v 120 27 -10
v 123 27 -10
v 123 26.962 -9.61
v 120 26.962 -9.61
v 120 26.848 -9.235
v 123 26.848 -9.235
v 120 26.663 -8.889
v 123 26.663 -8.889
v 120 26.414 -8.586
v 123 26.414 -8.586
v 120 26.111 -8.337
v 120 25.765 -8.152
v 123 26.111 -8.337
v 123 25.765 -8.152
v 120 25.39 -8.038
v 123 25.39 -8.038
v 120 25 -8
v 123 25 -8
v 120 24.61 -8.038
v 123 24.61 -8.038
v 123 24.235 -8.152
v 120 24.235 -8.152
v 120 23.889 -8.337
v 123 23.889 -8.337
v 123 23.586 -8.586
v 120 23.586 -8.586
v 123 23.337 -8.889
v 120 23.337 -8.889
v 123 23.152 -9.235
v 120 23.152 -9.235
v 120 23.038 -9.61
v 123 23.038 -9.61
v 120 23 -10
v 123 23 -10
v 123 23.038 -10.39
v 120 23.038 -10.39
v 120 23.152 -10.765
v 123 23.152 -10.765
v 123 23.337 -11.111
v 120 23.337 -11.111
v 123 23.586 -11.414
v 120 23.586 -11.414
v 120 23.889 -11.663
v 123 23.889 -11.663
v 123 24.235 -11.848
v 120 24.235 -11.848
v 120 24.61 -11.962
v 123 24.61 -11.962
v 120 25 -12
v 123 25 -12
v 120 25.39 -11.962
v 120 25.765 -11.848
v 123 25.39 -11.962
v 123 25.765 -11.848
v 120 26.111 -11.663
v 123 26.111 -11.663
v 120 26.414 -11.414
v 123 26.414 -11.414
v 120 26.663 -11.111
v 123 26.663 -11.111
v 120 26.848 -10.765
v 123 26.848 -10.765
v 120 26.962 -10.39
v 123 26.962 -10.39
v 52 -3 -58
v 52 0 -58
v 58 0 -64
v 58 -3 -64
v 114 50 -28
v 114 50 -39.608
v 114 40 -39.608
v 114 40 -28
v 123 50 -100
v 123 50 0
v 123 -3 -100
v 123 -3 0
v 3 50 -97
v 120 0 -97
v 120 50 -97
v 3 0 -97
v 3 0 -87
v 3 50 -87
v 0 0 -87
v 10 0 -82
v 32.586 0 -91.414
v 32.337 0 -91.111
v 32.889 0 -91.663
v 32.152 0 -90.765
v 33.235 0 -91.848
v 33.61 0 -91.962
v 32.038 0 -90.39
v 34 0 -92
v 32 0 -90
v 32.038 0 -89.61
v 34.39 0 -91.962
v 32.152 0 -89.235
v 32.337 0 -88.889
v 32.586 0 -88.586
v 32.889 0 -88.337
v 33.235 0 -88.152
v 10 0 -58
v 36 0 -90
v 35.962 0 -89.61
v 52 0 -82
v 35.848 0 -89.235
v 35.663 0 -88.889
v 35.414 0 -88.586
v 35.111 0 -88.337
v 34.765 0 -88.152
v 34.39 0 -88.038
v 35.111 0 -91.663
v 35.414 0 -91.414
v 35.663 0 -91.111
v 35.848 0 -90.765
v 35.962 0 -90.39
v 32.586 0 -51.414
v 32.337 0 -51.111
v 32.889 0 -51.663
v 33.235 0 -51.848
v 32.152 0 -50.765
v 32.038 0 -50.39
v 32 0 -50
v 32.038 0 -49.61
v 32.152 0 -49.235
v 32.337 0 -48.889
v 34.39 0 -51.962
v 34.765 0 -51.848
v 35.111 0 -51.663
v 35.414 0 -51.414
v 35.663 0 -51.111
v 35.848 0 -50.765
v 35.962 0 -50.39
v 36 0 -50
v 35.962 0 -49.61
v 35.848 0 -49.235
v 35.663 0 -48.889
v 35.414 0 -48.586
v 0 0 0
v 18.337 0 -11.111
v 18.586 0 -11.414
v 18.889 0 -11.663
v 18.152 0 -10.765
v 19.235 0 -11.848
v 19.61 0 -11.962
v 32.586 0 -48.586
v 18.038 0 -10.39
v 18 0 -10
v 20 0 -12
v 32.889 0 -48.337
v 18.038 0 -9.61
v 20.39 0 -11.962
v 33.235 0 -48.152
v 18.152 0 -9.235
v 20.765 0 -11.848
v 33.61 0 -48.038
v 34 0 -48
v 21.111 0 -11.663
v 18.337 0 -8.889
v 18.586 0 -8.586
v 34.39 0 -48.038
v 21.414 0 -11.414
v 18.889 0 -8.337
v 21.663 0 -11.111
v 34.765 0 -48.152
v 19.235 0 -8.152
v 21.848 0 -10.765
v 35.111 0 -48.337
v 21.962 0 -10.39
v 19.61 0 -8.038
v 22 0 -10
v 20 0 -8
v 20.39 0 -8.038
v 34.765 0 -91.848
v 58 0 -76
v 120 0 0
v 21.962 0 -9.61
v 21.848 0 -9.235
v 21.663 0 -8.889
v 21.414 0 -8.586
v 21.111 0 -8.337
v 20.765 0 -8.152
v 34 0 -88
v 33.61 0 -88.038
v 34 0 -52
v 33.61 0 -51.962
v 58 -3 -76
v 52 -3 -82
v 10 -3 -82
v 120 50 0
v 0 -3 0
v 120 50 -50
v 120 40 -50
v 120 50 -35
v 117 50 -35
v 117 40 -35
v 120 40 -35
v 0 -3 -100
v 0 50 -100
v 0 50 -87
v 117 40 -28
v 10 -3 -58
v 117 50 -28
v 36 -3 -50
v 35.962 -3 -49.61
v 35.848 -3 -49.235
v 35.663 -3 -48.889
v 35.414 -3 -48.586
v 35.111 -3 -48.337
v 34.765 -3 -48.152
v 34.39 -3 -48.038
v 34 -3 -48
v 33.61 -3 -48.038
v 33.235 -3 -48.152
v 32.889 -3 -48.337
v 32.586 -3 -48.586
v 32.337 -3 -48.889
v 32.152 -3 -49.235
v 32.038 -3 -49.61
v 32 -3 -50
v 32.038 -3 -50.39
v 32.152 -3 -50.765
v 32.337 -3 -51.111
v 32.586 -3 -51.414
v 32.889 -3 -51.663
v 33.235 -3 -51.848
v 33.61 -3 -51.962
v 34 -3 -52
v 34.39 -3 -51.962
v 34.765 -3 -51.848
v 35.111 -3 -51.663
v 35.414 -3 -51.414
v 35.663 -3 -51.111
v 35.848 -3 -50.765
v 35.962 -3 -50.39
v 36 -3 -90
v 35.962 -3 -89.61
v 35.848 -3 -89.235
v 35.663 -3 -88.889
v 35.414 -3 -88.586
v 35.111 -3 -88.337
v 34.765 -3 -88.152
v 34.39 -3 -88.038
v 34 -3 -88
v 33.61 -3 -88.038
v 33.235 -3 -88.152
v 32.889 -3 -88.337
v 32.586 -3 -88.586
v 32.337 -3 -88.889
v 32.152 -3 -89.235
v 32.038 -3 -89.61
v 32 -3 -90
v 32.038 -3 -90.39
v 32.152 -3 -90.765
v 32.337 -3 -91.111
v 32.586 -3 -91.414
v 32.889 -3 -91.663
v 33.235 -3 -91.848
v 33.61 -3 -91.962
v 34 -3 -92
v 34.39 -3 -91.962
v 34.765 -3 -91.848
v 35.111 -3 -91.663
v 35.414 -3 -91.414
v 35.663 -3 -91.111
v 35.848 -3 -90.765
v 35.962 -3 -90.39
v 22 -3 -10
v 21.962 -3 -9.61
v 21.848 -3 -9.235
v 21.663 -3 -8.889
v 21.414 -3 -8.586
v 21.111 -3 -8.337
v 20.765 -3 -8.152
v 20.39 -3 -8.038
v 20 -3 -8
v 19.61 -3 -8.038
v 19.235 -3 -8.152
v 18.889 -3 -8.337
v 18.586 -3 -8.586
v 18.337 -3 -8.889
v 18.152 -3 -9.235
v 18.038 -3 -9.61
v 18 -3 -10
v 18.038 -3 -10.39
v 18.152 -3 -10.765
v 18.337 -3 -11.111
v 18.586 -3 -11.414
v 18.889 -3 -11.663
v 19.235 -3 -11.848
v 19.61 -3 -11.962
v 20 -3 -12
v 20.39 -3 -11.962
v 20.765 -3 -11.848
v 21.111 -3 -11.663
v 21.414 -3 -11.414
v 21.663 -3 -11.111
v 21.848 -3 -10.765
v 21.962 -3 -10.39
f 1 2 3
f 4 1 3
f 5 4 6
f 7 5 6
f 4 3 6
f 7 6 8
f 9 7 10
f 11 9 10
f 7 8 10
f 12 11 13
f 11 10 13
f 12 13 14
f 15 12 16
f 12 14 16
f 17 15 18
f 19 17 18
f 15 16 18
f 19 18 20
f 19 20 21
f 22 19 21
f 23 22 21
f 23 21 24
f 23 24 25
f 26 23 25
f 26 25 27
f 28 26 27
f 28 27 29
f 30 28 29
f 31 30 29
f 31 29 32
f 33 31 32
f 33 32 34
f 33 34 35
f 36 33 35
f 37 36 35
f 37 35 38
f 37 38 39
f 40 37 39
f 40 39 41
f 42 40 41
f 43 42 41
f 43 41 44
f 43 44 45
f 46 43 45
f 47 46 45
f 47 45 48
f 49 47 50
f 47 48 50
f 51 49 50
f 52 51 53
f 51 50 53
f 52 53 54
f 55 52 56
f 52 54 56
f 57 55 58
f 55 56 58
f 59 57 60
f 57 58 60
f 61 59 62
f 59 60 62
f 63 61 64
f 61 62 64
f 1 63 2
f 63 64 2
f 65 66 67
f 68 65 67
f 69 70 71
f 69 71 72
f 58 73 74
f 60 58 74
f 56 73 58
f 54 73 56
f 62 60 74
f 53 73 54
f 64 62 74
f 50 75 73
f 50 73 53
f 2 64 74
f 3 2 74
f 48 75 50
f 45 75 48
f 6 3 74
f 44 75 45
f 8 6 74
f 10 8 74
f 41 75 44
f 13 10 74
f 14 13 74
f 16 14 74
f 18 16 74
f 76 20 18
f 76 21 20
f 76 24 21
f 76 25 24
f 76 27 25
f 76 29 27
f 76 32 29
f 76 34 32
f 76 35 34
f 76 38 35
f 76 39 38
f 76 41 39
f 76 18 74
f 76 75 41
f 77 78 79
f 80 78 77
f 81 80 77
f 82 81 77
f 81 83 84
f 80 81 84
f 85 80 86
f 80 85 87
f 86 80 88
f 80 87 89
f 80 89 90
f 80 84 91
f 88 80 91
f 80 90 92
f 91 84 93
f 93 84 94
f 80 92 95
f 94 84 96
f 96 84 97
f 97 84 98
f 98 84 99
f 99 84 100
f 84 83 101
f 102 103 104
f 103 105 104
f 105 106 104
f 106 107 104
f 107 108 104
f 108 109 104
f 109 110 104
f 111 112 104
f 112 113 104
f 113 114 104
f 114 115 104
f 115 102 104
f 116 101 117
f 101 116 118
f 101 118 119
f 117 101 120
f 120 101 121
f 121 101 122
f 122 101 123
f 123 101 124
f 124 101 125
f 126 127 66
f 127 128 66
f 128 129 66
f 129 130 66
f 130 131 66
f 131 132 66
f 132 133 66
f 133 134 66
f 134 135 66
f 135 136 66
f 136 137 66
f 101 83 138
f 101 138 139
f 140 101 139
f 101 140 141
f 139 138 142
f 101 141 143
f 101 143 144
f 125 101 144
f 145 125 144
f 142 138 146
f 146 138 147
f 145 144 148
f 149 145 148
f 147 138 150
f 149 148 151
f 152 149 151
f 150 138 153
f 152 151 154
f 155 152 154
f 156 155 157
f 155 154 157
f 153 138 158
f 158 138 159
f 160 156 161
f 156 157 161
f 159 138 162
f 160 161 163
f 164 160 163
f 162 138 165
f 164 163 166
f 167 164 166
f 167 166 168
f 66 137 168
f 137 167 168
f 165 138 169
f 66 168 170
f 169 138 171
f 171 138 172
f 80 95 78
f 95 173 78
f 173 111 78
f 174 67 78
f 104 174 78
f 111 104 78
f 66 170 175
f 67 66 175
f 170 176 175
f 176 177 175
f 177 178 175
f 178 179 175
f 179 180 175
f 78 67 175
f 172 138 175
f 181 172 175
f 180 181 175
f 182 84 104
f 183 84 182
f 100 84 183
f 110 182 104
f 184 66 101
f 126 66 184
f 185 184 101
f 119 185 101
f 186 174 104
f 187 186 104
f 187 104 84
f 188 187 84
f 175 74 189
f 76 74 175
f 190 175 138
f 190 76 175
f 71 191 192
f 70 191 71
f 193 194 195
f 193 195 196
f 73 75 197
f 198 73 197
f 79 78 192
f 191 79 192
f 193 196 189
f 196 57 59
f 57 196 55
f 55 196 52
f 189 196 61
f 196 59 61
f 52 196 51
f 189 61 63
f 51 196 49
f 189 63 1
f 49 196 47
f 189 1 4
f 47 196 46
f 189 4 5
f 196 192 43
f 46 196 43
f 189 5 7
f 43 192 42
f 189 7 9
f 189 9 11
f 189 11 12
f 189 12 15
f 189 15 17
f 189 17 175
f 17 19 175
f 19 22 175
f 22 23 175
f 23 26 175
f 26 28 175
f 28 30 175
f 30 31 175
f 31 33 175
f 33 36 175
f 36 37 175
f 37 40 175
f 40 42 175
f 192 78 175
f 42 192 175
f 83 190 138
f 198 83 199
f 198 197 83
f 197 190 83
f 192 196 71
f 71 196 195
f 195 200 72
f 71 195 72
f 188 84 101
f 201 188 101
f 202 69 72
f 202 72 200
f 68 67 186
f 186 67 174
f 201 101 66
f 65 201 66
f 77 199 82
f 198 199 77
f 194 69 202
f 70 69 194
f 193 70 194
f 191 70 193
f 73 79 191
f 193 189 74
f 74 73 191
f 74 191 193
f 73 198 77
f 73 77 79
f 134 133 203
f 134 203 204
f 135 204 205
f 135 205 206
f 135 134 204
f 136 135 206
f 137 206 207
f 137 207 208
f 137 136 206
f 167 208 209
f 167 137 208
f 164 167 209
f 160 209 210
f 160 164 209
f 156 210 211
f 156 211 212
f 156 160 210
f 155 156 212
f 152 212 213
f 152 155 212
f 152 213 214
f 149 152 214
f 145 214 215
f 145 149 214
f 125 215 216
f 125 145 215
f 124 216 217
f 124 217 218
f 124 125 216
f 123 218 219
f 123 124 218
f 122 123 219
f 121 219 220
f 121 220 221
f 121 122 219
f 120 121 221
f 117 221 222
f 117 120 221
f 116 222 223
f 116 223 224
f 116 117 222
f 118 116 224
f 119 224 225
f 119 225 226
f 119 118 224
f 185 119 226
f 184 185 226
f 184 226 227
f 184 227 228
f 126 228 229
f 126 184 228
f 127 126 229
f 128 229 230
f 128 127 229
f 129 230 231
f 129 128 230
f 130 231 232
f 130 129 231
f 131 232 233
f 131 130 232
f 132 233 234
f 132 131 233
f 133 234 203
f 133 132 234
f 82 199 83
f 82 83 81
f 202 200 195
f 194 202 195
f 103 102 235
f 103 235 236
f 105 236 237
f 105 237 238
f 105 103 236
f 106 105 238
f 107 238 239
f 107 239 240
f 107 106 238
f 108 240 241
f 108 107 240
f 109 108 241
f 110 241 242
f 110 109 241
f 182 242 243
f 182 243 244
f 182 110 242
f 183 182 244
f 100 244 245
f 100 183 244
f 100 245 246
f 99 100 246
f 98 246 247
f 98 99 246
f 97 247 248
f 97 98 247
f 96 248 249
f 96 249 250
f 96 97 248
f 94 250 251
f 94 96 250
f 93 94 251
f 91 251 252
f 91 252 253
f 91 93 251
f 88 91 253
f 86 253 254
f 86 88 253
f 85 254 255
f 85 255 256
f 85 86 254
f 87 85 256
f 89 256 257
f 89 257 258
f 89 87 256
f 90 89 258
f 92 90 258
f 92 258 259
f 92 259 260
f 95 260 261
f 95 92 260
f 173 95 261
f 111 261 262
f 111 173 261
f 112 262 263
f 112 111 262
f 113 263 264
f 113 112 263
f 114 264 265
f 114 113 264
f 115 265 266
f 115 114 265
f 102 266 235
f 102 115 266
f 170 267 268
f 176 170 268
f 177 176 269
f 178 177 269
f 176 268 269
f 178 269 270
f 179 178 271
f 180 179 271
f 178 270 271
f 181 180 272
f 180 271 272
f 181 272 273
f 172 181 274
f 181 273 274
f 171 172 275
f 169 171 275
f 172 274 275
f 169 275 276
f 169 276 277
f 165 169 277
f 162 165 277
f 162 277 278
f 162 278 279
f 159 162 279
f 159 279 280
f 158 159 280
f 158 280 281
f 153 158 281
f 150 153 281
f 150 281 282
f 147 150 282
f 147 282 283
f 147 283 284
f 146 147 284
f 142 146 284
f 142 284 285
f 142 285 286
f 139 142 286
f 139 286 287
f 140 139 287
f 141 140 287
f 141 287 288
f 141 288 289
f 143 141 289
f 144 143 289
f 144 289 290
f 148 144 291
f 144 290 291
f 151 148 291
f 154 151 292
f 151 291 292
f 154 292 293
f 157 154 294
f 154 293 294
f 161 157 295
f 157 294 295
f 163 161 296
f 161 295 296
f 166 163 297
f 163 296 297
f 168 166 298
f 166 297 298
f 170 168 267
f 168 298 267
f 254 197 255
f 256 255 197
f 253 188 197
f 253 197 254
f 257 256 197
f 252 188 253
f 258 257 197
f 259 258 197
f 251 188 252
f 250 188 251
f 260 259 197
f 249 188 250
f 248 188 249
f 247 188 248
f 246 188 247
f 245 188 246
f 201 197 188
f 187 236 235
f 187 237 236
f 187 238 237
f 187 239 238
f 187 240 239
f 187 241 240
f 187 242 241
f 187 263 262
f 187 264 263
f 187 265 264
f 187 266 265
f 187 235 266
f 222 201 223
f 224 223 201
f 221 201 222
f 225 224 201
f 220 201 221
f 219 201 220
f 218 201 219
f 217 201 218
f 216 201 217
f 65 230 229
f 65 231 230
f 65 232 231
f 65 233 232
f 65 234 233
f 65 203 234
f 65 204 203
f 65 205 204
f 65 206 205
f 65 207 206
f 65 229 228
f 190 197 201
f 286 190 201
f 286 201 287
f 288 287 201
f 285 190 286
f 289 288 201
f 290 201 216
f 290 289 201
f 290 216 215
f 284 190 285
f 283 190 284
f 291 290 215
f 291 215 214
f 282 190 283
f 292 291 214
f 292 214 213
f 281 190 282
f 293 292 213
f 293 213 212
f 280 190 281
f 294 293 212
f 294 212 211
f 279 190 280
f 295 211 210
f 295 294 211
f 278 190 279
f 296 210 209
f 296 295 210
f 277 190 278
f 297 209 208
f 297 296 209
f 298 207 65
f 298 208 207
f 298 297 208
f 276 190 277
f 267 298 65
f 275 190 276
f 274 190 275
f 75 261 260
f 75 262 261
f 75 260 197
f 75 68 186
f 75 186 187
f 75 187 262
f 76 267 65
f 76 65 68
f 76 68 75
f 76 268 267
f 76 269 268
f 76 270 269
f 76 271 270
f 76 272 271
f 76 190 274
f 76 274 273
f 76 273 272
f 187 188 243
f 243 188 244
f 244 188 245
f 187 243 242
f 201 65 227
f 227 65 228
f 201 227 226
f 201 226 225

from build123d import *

# Parameters (mm, degrees)
F0_W      = 123
F0_H      = 100
F0_R      = 2
F1_DEPTH  = 3
F2_W      = 3
F2_H      = 100
F3_DEPTH  = 50
F4_W      = 120
F4_H      = 3
F5_DEPTH  = 50
F6_R      = 2
F7_DEPTH  = 53.001
F8_R      = 2
F9_DEPTH  = 123.001
F10_W     = 3
F10_H     = 50
F11_DEPTH = 10
F13_DEPTH = 10


with BuildPart() as f1:
    # F0 (on Front) → F1 (new body)
    with BuildSketch(Plane.XZ):
        with Locations((61.5, -50)):
            Rectangle(F0_W, F0_H)
        with Locations((34, -90)):
            Circle(F0_R, mode=Mode.SUBTRACT)
        Polygon((10, -82), (10, -58), (52, -58), (58, -64), (58, -76), (52, -82), align=None, mode=Mode.SUBTRACT)
        with Locations((34, -50)):
            Circle(F0_R, mode=Mode.SUBTRACT)
    extrude(amount=F1_DEPTH)

    # F2 (on face) → F3 (join)
    with BuildSketch(Plane(origin=(0, 0, 0), x_dir=(-1, 0, 0), z_dir=(0, 1, 0))):
        with Locations((-121.5, -50)):
            Rectangle(F2_W, F2_H)
    extrude(amount=F3_DEPTH)

    # F4 (on face) → F5 (join)
    with BuildSketch(Plane(origin=(0, 0, 0), x_dir=(-1, 0, 0), z_dir=(0, 1, 0))):
        with Locations((-60, -98.5)):
            Rectangle(F4_W, F4_H)
    extrude(amount=F5_DEPTH)

    # F6 (on face) → F7 (cut, through all)
    with BuildSketch(Plane.XZ.offset(3)):
        with Locations((20, -10)):
            Circle(F6_R)
    extrude(amount=-F7_DEPTH, mode=Mode.SUBTRACT)

    # F8 (on face) → F9 (cut, through all)
    with BuildSketch(Plane.YZ.offset(123)):
        with Locations((25, -10)):
            Circle(F8_R)
    extrude(amount=-F9_DEPTH, mode=Mode.SUBTRACT)

    # F10 (on face) → F11 (join)
    with BuildSketch(Plane.XY.offset(-97)):
        with Locations((1.5, 25)):
            Rectangle(F10_W, F10_H)
    extrude(amount=F11_DEPTH)

    # F12 (on face) → F13 (join)
    with BuildSketch(Plane(origin=(0, 50, 0), x_dir=(-1, 0, 0), z_dir=(0, 1, 0))):
        Polygon((-120, -35), (-120, -50), (-114, -39.607695), (-114, -28), (-117, -28), (-117, -35), align=None)
    extrude(amount=-F13_DEPTH)


solid = f1.part
